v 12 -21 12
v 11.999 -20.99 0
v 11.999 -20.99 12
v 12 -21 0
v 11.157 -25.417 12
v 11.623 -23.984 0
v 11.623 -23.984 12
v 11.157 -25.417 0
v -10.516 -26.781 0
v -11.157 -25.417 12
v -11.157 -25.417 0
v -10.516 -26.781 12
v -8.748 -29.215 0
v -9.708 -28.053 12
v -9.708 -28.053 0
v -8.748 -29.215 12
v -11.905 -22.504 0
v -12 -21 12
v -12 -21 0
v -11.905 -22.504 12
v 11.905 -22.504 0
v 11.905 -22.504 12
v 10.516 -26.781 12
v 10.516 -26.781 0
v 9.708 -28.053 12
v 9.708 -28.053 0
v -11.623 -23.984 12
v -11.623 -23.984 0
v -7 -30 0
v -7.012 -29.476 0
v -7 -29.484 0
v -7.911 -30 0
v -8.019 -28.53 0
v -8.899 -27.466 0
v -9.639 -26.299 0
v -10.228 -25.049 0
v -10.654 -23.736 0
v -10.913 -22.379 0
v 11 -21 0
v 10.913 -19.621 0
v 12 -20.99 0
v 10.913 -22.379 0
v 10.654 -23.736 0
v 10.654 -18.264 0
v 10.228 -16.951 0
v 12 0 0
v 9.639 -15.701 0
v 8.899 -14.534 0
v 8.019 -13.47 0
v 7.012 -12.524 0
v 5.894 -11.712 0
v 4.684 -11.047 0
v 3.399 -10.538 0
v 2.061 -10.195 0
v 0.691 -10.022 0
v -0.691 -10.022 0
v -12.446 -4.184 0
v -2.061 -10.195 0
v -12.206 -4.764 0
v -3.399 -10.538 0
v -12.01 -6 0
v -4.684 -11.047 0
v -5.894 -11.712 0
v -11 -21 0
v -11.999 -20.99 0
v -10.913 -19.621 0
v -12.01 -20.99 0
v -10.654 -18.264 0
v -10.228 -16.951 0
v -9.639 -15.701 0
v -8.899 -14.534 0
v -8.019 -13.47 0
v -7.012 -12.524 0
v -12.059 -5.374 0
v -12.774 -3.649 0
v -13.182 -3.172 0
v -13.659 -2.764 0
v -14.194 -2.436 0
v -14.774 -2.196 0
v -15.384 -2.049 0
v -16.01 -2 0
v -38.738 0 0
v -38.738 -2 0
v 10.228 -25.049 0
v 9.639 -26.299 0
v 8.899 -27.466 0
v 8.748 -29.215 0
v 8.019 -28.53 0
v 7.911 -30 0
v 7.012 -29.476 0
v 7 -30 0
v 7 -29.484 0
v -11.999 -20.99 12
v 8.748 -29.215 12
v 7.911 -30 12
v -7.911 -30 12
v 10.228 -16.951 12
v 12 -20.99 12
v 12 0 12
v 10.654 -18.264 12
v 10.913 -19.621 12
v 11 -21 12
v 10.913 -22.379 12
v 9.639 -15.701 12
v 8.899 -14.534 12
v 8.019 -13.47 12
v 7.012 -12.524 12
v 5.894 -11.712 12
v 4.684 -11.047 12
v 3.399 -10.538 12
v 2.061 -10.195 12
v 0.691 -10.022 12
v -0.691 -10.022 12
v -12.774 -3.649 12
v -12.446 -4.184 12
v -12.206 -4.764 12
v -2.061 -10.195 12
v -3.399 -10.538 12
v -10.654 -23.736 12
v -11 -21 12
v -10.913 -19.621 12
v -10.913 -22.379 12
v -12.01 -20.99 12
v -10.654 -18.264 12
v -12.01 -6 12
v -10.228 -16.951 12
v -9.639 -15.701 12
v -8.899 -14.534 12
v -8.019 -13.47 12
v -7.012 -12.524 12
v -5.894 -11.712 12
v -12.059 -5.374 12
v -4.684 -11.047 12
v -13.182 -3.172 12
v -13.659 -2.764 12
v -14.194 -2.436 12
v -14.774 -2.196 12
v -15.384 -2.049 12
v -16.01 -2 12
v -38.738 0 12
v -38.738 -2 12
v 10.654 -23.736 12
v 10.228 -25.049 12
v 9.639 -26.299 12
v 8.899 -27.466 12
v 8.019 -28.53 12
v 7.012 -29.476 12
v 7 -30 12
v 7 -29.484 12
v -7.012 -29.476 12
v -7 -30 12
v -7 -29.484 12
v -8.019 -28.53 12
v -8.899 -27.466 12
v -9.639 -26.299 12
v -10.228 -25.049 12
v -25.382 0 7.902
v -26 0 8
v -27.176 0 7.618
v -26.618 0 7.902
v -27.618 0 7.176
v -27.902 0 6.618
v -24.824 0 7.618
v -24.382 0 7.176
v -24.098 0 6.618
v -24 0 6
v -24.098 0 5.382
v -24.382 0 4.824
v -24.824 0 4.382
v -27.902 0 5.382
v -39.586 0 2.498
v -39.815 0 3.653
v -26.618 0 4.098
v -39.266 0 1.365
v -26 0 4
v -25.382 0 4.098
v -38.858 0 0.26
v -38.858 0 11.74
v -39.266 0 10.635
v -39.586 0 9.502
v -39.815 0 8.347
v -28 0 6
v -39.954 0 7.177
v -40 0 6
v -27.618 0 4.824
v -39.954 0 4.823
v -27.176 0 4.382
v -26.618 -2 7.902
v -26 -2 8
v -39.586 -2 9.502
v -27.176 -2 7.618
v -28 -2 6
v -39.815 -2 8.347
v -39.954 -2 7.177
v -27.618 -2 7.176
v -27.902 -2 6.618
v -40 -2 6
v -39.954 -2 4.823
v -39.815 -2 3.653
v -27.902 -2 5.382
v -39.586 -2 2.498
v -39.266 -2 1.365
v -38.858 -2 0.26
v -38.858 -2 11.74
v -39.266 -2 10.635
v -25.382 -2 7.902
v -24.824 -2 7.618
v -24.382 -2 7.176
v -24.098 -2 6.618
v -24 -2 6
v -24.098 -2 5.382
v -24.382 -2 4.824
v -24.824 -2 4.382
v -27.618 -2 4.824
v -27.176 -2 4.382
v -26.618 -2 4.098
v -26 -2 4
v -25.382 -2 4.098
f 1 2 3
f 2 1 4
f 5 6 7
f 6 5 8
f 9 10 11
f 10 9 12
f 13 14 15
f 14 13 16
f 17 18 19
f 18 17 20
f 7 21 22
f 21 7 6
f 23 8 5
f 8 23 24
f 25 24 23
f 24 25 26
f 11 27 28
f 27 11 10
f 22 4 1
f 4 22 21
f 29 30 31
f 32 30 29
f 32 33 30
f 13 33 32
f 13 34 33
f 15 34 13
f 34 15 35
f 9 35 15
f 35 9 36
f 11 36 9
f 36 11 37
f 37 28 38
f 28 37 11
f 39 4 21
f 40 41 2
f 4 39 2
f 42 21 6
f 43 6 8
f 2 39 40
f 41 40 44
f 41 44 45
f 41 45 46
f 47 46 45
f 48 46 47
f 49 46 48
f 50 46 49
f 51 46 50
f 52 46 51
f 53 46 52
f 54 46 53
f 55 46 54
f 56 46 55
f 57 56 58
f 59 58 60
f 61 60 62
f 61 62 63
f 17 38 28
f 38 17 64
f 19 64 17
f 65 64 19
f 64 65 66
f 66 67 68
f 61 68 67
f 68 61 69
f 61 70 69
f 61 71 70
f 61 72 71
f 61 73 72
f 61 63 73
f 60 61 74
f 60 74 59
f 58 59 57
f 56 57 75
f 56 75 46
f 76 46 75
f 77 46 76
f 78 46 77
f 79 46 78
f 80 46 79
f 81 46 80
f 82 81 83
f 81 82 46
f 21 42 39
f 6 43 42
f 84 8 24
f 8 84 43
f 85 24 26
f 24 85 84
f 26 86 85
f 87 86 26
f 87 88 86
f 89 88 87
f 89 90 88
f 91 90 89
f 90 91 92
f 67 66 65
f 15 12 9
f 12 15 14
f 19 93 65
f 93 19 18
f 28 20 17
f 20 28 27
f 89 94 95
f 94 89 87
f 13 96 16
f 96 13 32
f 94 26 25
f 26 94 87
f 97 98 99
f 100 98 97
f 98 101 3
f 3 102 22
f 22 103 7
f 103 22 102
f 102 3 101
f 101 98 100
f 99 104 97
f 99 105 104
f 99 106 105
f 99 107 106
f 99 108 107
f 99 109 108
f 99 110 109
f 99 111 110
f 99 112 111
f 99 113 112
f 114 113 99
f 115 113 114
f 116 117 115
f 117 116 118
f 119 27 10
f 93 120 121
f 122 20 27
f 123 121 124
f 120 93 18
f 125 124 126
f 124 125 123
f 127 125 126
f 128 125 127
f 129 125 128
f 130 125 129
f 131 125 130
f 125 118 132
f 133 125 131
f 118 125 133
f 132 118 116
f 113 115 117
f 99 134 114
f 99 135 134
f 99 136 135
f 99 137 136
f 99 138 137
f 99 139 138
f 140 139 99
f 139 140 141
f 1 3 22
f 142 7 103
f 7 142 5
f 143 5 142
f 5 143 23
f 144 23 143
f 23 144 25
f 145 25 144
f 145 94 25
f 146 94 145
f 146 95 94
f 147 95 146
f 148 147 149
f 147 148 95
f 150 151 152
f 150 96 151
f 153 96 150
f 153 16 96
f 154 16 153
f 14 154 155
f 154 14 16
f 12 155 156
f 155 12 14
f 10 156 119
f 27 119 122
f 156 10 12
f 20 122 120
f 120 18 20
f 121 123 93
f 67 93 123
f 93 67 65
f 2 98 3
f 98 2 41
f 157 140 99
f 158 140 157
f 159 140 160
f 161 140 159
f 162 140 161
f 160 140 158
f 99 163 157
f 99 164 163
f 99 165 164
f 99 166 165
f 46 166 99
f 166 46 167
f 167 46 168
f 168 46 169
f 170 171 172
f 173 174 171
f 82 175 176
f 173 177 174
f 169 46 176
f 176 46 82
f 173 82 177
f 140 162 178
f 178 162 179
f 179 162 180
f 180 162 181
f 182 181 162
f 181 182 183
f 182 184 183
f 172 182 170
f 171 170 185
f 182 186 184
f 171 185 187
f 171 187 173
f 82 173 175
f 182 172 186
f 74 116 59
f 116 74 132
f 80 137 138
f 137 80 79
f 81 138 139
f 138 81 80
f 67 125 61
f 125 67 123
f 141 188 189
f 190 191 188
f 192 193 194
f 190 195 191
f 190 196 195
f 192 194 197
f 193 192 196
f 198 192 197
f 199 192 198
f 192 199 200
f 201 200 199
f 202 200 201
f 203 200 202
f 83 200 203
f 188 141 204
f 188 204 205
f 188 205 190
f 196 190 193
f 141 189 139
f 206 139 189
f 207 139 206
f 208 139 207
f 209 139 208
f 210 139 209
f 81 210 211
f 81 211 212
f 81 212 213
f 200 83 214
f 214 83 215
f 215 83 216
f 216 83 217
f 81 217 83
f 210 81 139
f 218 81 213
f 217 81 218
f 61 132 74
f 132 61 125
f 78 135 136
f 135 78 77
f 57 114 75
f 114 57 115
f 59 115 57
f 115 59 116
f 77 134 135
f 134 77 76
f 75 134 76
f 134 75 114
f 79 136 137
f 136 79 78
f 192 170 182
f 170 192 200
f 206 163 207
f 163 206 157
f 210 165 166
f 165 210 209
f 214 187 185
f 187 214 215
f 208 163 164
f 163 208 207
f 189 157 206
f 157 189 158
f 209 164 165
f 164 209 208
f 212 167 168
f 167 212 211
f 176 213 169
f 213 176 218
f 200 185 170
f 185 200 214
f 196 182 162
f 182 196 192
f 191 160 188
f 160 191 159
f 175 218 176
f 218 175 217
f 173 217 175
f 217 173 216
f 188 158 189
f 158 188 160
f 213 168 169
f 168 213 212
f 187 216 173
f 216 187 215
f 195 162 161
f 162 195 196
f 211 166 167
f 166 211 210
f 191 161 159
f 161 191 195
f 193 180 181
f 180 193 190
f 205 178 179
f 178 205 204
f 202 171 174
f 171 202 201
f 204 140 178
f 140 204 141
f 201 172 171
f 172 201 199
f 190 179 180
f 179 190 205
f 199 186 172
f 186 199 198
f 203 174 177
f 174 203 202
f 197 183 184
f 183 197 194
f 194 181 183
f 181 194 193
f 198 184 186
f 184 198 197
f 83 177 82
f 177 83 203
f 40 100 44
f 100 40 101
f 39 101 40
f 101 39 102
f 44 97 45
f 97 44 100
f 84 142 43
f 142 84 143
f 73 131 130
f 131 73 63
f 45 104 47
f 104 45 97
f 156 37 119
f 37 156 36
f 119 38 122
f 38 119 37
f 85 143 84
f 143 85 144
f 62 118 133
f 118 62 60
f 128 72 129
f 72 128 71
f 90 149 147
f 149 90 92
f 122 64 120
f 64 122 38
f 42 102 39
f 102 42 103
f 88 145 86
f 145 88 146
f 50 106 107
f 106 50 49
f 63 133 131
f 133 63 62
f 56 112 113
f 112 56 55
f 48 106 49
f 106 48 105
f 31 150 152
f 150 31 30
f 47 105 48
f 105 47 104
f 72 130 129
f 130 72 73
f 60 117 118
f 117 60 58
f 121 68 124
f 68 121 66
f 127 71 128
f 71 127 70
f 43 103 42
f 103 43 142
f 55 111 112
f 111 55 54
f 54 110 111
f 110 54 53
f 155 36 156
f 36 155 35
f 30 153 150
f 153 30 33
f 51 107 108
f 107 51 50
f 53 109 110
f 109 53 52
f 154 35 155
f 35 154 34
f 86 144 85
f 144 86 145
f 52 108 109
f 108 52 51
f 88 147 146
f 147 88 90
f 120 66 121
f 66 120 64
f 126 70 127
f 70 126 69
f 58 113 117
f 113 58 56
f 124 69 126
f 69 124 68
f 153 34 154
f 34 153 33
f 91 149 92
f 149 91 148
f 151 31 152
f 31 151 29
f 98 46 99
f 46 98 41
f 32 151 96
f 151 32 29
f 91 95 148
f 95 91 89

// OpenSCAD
intersection(){
    translate([-40,-30]) cube([52,30,30]);
strap(pd=22,mount=2,type=1,offset=8,h=12);
}
*for(x=[0:4])
{
  translate([32*x,(x<=2?x:4-x)*-20]) {
    strap(mount=(x==0||x==4?1:0),t=2,type=1,offset=2,h=20);
    if(x>0&&x<4)
      translate([-19,(x<=2?x:4-x)*-2]) cube([38,(x<=2?x:4-x)*22,20]);
  }
}
module strap(pd=25,t=2,h=30,type=1,mount=1,offset=4)
{
translate([-40,0]) rotate([90,0]) intersection(){
  cube([80,h,pd+offset+(type==0?2:4)]);
  difference(){
    union(){
      translate([40,0,pd/2+offset+(type==1?2:0)]) rotate([-90,0])
        cylinder(d=pd+t,h=h,$fn=50);
      cube([80,h,pd/2+(type==1?2:0)+offset-.01]);
    }
    translate([40,-.01,pd/2+offset+(type==1?2:0)]) rotate([-90,0]) 
        cylinder(d=pd,h=h+.02,$fn=50);
    translate([40,0]) for(m=[0,1]) mirror([m,0]) translate([-40,0])
      translate([-.01,h+1,2]) rotate([90,0]) linear_extrude(31.02) {
        translate([0,4]) square([40-t/2-pd/2,pd/2+offset]);
        translate([40-t/2-pd/2-4,4]) circle(d=8,$fn=40);
        square([35-pd/2,4]);
      }
    if(type!=0||mount==0) translate([44-pd/2,-.01,(type==0?-.01:offset+pd/2+4)]) cube([pd-8,30.02,pd/2]);
    if(mount==2) {
      translate([40/2-(pd+2)/4,h/2,-.01]) cylinder(d=4,h=2.02,$fn=20);
      translate([60+(pd+2)/4,h/2,-.01]) cylinder(d=4,h=2.02,$fn=20);
    } else if(mount==1) {
      for(ho=[h/2])//h/4,h*3/4])
      translate([40,ho,-.01]) {
        cylinder(d=4,h=offset+4,$fn=20);
        translate([0,0,offset-1]) cylinder(d1=4,d2=8,h=2.01,$fn=40);
        translate([-4,-4,offset+1]) cube([8,8,2]);
      }
    }
  translate([40,0]) for(m=[0,1]) mirror([m,0]) translate([-40,0]) difference(){
    translate([-.01,-.01,-.01]) cube([30.02,h+.02,3.02]);
    if(mount==2||mount==3) {
      translate([15,h/2,-.01]) cylinder(d=30,h=3.02,$fn=80);
      translate([15,-.01,-.01]) cube([40-pd/2,30.02,3.02]);
    } else
      translate([40-pd/2-4,-.01,-.01]) cube([pd/2,30.02,3.02]);
  }
}
}
}
